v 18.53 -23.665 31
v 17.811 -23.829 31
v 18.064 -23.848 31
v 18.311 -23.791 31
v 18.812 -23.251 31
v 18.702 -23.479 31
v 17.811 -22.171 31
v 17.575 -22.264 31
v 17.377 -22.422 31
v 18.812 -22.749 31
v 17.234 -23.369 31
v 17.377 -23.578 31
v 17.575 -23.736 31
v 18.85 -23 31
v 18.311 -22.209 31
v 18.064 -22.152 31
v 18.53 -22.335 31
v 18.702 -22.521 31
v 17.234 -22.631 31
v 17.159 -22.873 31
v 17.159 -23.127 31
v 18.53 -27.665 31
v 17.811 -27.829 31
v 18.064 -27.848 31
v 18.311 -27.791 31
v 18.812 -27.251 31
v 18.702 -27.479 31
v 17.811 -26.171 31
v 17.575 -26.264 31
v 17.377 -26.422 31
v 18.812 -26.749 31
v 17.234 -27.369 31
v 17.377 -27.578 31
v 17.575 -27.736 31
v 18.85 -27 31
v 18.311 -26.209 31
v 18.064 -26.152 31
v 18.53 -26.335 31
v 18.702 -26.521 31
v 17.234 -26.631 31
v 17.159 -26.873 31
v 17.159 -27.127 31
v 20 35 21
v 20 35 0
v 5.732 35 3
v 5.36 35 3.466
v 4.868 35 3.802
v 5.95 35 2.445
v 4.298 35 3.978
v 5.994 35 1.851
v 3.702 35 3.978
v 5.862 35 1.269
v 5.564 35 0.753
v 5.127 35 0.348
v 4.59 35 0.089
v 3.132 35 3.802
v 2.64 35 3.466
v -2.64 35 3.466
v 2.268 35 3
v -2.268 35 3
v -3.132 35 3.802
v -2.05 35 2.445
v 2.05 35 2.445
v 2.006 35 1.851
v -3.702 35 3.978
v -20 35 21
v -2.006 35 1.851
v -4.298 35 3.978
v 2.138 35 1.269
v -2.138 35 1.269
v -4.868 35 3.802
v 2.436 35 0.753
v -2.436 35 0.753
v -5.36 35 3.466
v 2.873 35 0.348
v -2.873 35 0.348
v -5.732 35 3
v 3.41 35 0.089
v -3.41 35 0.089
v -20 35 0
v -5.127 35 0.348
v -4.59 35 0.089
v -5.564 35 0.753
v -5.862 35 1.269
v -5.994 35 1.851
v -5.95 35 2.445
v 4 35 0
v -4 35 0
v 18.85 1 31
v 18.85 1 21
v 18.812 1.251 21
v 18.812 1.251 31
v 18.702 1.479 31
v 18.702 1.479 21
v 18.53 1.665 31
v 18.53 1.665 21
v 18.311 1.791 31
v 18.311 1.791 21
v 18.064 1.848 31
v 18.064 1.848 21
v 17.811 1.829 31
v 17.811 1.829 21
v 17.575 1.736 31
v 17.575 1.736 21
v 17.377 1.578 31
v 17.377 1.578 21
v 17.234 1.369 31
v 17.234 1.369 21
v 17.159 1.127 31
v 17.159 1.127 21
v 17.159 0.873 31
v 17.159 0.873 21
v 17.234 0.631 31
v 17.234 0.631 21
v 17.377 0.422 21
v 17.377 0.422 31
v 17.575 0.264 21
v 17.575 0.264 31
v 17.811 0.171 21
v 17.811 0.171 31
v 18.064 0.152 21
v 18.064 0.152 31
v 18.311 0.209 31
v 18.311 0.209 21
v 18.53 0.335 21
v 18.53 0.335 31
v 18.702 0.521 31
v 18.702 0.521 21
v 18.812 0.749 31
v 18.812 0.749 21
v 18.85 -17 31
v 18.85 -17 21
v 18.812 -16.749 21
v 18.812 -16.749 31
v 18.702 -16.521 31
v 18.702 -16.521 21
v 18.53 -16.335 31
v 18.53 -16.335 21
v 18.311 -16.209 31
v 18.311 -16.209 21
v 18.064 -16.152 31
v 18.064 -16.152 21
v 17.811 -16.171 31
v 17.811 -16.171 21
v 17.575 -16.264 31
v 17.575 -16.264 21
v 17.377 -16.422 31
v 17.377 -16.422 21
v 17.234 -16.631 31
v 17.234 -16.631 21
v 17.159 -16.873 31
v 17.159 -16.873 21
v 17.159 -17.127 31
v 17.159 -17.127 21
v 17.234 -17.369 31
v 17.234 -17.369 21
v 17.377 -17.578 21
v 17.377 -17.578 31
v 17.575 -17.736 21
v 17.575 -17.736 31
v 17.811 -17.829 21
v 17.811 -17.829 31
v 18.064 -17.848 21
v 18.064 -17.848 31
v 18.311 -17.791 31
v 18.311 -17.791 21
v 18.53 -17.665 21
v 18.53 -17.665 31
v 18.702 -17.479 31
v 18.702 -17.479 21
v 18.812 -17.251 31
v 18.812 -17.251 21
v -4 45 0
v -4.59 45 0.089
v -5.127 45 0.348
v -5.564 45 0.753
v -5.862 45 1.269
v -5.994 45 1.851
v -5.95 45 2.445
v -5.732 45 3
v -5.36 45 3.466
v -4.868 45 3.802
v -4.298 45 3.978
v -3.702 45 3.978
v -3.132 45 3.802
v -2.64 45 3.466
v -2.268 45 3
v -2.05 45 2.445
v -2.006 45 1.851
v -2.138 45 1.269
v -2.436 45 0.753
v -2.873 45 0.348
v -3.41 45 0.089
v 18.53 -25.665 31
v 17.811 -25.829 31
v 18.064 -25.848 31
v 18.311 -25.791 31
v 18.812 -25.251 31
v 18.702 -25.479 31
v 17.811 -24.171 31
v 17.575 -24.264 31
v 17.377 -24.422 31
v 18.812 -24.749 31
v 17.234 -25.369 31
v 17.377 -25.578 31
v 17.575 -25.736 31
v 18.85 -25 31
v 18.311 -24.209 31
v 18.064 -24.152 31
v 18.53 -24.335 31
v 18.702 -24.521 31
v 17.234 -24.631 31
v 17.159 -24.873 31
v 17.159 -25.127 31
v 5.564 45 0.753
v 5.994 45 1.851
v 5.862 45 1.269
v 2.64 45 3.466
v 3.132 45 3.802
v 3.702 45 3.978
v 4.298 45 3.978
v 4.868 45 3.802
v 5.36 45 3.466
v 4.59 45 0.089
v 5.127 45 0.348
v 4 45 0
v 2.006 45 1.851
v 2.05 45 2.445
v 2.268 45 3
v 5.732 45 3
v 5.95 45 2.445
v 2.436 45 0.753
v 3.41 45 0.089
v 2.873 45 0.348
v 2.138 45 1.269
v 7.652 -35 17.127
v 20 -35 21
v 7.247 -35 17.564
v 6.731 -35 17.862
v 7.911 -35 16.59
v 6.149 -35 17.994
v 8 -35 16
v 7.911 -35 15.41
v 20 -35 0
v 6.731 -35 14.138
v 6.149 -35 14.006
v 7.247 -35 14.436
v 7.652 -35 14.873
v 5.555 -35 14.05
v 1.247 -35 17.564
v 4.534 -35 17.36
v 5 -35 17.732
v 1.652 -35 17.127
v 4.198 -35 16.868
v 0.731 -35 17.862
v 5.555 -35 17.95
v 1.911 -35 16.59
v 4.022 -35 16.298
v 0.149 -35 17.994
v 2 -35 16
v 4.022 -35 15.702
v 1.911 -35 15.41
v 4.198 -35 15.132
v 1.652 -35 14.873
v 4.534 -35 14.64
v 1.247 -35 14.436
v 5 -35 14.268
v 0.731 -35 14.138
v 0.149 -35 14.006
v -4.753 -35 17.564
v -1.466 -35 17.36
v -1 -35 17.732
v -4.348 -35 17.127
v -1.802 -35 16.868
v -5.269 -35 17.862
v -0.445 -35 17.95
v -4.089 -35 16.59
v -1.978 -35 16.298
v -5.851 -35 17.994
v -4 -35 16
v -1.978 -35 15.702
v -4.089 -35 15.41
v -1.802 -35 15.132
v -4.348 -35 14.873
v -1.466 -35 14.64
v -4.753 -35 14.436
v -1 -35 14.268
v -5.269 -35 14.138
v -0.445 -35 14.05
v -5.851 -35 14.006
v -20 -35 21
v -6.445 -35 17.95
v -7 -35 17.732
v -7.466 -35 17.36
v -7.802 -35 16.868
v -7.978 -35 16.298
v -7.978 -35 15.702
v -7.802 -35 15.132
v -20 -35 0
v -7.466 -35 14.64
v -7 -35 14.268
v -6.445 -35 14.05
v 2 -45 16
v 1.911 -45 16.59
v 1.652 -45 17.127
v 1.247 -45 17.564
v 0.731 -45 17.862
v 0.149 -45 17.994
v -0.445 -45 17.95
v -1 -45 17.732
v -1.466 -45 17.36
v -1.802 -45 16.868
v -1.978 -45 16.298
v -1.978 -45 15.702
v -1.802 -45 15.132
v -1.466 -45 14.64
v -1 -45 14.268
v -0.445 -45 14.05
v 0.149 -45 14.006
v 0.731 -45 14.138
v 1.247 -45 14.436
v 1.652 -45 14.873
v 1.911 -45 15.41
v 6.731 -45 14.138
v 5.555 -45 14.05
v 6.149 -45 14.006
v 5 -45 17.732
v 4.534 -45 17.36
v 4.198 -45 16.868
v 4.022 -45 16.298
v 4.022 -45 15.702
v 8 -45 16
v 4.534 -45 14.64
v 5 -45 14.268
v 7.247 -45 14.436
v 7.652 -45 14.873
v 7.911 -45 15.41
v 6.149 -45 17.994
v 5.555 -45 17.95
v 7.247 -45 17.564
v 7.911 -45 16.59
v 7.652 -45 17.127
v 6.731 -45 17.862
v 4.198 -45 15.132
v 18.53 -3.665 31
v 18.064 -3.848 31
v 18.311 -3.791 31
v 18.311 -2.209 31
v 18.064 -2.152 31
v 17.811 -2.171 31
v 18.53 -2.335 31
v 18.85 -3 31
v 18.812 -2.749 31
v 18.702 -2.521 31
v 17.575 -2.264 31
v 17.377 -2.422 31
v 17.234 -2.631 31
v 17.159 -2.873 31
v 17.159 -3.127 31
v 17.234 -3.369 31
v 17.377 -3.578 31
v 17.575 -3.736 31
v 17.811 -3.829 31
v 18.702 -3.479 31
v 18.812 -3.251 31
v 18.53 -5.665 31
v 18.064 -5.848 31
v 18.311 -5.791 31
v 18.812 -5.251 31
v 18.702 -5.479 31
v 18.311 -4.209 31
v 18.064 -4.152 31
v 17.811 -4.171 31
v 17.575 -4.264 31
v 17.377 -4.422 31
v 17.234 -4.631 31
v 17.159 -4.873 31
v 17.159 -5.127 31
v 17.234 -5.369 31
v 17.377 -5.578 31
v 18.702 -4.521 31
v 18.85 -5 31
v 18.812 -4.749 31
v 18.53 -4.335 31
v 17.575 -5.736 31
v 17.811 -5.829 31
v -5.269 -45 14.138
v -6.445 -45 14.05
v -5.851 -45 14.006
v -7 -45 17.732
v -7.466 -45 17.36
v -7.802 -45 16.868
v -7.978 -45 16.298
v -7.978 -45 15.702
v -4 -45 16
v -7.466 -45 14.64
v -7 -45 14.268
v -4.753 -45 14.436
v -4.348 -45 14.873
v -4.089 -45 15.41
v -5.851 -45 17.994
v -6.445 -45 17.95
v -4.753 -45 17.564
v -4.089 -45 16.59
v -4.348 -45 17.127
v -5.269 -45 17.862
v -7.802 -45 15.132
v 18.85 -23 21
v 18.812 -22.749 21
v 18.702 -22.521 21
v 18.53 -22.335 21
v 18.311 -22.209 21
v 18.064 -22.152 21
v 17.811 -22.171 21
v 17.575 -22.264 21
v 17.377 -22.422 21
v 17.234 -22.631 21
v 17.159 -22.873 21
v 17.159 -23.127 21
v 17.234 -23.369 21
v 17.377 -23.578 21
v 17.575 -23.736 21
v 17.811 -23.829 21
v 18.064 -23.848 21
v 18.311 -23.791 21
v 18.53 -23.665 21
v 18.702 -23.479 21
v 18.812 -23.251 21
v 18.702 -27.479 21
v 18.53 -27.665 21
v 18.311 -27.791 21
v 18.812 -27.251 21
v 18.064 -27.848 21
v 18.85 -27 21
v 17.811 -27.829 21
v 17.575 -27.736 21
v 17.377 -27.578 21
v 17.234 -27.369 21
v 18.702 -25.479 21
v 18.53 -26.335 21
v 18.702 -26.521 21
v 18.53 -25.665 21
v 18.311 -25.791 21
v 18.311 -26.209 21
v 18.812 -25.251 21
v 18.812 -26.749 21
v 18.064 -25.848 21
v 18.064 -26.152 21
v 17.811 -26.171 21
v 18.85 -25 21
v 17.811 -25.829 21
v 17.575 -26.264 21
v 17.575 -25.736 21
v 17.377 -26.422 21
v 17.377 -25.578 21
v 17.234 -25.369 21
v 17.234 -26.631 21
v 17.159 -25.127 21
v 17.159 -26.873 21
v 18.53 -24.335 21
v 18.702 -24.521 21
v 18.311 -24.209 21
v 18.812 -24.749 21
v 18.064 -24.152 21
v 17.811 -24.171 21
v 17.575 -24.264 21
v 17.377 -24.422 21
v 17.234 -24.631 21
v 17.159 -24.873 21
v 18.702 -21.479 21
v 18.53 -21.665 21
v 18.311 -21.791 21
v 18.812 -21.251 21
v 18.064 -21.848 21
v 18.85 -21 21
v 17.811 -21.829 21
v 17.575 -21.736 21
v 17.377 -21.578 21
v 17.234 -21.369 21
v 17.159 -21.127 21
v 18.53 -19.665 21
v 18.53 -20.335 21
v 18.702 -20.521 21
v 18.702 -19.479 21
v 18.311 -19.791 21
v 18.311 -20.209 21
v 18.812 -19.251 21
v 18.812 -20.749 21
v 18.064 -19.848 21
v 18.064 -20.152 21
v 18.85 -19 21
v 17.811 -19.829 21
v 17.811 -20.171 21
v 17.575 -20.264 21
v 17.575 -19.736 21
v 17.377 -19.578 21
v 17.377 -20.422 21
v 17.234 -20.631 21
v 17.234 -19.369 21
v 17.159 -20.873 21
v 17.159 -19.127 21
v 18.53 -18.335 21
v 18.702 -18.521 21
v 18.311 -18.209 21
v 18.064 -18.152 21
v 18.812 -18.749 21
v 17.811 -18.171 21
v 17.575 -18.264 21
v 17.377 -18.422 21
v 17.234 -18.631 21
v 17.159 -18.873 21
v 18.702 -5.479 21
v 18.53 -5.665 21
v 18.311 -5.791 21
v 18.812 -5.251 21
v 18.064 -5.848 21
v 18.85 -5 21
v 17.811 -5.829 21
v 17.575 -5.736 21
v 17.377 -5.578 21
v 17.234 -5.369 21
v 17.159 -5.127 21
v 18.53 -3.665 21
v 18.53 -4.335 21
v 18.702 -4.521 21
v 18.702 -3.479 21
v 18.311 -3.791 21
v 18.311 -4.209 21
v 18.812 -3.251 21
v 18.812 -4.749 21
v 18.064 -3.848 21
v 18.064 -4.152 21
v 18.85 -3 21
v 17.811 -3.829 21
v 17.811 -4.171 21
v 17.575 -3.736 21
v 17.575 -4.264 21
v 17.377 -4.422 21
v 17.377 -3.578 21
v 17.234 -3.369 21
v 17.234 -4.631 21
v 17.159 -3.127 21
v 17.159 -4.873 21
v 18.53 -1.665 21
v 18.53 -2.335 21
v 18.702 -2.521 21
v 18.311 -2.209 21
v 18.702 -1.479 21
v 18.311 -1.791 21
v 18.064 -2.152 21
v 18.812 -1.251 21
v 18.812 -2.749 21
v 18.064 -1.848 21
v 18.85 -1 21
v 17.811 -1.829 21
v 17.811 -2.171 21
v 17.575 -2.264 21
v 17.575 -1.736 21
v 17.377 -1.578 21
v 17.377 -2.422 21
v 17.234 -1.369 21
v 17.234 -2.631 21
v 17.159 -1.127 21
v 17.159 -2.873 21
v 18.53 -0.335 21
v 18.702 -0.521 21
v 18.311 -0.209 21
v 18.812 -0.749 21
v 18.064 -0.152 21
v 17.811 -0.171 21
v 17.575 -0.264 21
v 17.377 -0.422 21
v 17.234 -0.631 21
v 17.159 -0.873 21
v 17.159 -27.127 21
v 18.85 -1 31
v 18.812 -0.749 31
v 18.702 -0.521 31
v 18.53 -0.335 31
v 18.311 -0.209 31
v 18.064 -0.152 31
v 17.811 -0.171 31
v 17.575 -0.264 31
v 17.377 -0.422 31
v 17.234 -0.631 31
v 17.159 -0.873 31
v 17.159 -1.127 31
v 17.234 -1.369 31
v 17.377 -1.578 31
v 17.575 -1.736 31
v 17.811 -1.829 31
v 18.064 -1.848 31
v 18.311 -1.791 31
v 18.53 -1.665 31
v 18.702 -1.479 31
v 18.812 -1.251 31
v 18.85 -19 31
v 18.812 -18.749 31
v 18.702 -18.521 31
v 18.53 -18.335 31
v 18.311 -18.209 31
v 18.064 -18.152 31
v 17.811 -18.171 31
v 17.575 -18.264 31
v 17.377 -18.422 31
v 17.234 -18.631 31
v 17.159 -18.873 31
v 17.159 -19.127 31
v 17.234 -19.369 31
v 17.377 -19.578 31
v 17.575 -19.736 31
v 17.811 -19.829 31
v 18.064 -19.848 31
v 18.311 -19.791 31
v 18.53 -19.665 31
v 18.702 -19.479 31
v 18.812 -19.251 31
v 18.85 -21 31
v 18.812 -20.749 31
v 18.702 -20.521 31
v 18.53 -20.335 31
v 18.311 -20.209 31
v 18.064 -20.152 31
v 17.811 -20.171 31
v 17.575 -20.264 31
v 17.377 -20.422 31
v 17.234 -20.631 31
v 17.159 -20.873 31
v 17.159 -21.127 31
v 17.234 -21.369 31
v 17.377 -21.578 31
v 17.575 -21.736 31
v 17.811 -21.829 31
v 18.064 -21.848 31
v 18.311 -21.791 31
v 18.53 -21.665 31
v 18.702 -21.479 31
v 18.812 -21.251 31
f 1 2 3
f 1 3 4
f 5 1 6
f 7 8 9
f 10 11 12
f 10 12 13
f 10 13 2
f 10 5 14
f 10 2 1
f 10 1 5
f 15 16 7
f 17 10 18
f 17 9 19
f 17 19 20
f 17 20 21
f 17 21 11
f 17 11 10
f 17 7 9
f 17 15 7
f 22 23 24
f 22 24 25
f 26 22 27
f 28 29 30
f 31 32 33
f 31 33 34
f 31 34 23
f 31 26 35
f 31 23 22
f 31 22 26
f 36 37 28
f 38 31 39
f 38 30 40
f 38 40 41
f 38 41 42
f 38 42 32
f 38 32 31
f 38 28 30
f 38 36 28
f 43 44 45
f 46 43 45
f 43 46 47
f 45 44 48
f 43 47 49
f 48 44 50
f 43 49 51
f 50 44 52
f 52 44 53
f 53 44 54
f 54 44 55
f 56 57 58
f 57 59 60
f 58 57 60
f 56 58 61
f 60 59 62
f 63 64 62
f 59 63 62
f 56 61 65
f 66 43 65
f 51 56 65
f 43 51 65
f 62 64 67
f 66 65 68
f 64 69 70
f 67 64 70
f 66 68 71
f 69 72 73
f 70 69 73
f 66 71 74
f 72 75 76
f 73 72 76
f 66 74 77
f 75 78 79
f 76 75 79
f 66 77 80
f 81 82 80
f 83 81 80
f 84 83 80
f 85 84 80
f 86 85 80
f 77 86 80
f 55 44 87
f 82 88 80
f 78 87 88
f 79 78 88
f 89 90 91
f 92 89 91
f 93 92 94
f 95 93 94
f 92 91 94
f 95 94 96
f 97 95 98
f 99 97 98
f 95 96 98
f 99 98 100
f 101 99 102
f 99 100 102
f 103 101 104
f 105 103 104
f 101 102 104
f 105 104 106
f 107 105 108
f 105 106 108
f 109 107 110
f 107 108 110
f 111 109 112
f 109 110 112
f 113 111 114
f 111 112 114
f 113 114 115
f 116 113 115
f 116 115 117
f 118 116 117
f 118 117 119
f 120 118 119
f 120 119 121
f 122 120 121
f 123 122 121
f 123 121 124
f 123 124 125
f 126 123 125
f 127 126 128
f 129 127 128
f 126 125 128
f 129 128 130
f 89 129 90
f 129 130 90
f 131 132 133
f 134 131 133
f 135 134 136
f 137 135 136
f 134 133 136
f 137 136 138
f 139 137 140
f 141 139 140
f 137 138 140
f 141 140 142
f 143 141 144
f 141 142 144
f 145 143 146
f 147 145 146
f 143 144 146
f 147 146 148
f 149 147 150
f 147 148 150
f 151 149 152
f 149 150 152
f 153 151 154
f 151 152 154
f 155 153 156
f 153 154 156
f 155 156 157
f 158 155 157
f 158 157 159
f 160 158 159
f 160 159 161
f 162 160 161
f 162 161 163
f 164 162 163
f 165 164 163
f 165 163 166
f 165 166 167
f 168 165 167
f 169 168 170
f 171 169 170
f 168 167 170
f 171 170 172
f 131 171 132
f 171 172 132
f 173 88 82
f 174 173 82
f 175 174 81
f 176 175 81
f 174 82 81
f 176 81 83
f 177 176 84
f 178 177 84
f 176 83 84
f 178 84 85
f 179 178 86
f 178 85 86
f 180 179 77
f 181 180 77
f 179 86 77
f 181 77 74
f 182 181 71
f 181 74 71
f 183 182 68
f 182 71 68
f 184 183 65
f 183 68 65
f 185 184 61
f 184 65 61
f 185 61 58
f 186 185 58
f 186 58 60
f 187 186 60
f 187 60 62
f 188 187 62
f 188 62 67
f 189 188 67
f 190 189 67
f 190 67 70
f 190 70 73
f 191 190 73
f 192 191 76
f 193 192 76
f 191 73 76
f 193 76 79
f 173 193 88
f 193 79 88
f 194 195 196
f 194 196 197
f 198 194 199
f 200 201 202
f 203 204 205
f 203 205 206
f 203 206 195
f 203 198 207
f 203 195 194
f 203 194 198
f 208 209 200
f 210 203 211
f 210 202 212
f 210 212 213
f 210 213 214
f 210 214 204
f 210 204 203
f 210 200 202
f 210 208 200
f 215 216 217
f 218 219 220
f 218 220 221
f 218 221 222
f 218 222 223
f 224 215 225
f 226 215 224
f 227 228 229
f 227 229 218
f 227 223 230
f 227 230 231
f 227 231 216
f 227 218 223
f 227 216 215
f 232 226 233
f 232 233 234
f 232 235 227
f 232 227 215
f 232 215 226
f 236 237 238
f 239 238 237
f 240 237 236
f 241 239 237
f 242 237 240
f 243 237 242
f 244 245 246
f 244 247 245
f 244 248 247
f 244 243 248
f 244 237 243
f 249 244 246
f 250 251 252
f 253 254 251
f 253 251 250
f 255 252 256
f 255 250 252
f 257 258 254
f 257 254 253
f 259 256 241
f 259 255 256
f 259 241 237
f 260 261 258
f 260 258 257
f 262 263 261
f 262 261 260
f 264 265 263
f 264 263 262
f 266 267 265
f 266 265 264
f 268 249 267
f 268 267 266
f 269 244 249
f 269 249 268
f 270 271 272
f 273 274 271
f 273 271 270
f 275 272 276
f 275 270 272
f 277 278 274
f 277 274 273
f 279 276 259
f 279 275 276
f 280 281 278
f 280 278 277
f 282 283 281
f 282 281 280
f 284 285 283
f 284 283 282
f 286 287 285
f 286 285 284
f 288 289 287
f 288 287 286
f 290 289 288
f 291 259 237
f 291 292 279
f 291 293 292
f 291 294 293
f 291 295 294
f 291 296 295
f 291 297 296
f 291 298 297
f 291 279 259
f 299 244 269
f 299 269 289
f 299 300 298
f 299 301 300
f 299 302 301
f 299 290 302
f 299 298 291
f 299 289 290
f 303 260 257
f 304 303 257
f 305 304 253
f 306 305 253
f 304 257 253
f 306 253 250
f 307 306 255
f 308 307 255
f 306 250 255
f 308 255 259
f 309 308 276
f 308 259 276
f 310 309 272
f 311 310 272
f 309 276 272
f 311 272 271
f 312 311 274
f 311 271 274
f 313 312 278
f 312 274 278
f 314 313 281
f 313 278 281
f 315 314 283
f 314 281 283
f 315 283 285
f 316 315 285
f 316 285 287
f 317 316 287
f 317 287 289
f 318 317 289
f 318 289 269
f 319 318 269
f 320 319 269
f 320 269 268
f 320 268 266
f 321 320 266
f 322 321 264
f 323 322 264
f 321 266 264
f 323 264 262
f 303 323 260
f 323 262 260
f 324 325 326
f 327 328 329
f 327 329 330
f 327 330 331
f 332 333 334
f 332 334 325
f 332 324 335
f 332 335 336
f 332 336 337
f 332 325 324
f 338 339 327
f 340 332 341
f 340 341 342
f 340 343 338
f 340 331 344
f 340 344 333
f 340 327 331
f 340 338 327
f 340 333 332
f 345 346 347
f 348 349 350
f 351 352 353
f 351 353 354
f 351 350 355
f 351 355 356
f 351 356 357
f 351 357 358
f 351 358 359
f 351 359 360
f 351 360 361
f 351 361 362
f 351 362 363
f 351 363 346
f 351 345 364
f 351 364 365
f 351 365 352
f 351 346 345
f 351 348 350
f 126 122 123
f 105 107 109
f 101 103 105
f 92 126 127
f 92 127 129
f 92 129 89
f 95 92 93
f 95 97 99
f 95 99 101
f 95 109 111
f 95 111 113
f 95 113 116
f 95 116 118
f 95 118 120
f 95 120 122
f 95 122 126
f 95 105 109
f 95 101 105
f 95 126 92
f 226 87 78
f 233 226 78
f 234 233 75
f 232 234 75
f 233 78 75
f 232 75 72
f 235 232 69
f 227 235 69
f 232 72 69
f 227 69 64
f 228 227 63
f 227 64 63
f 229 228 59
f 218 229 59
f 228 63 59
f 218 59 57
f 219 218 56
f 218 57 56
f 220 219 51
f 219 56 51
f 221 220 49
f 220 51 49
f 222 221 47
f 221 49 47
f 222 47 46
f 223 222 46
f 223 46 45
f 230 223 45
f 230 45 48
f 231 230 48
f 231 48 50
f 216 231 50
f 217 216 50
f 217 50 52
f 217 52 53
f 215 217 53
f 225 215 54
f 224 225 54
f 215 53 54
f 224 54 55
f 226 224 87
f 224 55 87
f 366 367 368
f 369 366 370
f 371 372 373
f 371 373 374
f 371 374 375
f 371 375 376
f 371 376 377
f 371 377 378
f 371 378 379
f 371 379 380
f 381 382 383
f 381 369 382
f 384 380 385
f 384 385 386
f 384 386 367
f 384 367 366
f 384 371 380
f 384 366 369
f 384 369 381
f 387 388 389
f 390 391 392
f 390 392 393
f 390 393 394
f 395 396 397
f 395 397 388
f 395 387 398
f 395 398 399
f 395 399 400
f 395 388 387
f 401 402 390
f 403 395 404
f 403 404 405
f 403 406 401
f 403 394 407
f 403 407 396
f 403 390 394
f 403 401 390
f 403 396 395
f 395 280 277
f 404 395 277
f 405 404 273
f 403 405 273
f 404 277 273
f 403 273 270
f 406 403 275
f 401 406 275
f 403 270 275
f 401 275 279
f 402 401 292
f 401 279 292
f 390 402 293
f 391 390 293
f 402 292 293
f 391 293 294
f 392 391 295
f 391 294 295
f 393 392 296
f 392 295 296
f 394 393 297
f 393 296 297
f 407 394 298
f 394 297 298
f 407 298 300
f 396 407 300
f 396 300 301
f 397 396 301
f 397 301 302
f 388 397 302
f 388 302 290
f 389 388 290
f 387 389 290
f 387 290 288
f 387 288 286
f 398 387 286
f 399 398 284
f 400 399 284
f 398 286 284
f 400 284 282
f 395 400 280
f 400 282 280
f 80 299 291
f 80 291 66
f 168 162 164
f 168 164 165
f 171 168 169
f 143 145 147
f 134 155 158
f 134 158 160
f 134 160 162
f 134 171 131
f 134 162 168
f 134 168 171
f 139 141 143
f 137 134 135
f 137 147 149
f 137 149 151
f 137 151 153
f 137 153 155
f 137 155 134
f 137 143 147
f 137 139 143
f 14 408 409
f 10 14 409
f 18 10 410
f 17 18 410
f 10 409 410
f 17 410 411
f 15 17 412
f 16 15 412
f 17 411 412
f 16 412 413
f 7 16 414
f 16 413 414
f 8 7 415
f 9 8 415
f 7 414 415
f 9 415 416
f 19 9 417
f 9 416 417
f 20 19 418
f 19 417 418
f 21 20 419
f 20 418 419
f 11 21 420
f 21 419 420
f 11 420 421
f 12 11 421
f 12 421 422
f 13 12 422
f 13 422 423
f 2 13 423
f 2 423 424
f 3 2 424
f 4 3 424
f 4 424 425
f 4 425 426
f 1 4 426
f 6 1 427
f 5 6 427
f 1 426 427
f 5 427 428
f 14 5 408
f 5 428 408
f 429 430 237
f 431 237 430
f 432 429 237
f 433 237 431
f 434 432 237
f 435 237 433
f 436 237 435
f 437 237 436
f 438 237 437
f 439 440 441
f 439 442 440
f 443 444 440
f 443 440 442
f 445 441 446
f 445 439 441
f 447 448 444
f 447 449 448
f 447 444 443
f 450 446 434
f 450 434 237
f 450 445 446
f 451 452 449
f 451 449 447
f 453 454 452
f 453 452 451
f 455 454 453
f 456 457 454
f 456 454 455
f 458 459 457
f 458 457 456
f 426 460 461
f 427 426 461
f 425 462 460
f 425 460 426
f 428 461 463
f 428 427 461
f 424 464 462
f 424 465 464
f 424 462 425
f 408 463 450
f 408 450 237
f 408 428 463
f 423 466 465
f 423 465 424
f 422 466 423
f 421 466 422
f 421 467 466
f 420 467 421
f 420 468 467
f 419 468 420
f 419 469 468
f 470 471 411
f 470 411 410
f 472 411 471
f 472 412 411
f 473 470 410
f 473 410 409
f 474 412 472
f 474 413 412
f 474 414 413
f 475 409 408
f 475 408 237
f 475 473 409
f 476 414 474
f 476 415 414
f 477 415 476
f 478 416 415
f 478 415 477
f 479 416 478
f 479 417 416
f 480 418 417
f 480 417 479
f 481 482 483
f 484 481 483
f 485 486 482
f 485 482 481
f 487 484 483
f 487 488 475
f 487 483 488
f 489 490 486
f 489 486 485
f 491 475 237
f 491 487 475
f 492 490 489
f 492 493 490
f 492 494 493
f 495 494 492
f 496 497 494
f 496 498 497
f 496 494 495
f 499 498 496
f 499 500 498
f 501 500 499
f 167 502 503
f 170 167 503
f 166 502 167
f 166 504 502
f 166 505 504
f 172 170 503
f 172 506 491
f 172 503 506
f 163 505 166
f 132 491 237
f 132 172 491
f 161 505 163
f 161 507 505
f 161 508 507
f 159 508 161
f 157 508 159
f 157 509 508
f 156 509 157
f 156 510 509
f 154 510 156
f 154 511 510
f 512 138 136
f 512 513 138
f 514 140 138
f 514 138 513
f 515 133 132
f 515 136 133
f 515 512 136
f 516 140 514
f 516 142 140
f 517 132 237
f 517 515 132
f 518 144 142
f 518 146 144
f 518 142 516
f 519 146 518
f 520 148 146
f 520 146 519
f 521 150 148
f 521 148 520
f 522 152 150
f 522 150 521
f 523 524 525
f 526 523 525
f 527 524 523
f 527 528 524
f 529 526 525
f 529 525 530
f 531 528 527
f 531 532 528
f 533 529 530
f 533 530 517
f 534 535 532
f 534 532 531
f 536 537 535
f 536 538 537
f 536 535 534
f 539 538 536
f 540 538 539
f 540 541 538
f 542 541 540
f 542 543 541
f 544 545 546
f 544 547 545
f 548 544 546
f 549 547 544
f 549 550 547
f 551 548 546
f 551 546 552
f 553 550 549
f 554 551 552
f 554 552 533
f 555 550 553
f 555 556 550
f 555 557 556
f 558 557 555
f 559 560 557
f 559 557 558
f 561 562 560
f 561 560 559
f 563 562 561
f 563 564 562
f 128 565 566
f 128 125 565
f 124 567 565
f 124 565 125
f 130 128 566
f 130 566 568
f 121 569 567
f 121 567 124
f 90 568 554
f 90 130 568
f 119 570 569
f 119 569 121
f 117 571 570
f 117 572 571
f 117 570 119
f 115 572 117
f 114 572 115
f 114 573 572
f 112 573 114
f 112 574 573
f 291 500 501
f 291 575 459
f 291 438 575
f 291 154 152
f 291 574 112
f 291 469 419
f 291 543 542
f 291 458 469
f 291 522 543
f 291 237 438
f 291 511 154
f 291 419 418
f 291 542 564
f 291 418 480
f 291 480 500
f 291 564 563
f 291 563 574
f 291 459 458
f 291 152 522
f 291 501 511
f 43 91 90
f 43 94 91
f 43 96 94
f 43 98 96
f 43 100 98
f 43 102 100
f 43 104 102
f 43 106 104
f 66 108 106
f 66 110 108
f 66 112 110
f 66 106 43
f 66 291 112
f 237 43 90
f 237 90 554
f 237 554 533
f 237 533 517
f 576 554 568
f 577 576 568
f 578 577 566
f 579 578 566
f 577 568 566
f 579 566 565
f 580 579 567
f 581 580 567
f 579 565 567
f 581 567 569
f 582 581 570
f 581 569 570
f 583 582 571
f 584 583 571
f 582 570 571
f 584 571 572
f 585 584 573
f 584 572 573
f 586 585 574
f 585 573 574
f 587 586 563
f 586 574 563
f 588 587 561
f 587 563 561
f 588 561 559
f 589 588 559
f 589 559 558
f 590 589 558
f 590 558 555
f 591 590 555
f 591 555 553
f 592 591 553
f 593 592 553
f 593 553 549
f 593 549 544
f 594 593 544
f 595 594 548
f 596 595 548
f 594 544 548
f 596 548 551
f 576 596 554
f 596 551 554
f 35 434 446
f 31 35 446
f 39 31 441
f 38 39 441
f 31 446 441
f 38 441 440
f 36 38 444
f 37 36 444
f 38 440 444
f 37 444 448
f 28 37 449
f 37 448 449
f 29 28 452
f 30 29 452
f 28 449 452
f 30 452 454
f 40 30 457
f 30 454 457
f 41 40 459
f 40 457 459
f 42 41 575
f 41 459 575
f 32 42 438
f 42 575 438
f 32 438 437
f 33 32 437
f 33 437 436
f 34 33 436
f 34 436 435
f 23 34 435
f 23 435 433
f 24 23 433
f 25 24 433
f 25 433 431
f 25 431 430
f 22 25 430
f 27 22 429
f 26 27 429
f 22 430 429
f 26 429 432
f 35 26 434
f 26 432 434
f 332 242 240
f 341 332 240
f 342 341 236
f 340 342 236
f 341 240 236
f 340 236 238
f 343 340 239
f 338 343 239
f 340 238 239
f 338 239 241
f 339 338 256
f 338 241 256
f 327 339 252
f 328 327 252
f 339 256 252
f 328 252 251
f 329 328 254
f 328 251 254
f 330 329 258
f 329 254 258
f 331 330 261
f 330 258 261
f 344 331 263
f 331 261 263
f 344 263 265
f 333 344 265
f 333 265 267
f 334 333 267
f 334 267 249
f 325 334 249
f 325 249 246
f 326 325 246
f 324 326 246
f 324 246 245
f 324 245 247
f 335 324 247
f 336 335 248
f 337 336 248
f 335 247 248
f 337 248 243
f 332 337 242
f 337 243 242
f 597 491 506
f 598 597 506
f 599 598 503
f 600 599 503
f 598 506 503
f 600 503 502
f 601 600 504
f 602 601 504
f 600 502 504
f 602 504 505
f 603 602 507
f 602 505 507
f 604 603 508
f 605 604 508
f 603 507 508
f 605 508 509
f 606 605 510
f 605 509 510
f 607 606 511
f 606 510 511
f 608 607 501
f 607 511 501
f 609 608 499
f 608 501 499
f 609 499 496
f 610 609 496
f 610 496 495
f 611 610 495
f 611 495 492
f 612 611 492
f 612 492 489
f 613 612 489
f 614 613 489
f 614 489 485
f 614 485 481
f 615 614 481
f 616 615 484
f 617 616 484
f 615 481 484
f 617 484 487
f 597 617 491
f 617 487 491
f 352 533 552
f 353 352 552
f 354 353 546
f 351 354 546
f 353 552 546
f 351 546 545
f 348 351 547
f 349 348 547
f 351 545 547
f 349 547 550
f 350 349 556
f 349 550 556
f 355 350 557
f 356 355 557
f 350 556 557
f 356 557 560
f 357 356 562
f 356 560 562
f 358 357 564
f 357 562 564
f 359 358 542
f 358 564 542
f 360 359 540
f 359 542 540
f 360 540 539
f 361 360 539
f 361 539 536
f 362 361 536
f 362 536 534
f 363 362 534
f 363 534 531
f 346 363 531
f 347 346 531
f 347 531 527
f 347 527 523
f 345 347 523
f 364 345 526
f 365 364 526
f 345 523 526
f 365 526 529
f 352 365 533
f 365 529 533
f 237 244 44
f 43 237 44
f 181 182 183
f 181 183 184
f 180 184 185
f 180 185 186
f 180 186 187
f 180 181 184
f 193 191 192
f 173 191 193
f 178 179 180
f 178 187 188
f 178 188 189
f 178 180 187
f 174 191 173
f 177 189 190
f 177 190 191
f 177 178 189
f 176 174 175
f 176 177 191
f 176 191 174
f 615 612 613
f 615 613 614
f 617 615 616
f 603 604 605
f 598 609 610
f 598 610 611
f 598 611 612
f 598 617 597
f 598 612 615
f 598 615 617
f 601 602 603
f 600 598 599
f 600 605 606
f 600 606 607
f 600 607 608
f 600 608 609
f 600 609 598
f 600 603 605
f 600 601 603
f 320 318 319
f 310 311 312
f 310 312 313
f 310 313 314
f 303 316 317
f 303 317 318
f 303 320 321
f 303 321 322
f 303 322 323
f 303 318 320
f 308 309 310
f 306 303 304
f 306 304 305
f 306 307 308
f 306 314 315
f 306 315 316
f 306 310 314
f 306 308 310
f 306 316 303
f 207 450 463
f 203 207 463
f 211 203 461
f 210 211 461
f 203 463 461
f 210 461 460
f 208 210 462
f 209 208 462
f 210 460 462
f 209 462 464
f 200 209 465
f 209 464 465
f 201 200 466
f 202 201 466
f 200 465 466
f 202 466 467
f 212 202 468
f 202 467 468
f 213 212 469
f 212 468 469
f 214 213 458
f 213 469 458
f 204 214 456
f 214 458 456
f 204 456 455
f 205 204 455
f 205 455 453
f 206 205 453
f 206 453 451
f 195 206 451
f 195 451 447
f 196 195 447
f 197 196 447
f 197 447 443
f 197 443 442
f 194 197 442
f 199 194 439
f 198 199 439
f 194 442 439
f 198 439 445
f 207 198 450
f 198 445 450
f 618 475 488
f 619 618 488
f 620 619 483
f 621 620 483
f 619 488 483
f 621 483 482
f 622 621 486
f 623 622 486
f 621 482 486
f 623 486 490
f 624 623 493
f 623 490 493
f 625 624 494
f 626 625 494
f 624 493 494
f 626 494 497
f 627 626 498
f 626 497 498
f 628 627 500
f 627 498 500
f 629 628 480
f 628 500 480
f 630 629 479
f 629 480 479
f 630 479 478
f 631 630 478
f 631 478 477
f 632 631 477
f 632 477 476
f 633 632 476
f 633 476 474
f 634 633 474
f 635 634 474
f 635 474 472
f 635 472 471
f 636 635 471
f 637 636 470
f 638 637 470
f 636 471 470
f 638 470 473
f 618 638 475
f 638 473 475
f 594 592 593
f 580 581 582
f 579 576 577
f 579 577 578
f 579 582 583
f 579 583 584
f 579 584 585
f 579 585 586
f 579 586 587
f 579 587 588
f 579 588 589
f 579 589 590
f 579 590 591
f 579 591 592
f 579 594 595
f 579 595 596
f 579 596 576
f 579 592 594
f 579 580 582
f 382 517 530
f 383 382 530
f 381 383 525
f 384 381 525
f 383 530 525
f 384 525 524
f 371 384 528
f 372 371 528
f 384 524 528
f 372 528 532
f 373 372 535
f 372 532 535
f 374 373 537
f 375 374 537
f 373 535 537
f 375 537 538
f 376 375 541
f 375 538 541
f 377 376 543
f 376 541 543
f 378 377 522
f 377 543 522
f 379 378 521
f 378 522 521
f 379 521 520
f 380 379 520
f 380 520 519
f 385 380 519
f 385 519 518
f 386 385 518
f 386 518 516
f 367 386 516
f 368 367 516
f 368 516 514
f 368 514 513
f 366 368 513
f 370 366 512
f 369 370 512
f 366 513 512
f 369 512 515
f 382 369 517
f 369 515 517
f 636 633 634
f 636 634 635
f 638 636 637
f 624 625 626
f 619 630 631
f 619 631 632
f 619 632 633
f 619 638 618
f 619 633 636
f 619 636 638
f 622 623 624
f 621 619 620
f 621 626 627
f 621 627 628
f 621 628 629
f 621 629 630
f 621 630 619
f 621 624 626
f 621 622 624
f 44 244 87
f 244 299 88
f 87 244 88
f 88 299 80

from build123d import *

# Parameters (mm, degrees)
SKETCH1_W           = 70
SKETCH1_H           = 40
BOSS_EXTRUDE1_DEPTH = 21
SKETCH2_R           = 2
BOSS_EXTRUDE2_DEPTH = 10
SKETCH3_R           = 2
BOSS_EXTRUDE3_DEPTH = 10
SKETCH4_R           = 0.85
BOSS_EXTRUDE4_DEPTH = 10


with BuildPart() as part:
    # Sketch1 → Boss-Extrude1 (new body)
    with BuildSketch(Plane(origin=(0, 0, 0), x_dir=(0, 1, 0), z_dir=(0, 0, 1))):
        Rectangle(SKETCH1_W, SKETCH1_H)
    extrude(amount=BOSS_EXTRUDE1_DEPTH)

    # Sketch2 → Boss-Extrude2 (add)
    with BuildSketch(Plane.XZ.offset(35)):
        with Locations((-6, 16)):
            Circle(SKETCH2_R)
        with Locations((0, 16)):
            Circle(SKETCH2_R)
        with Locations((6, 16)):
            Circle(SKETCH2_R)
    extrude(amount=BOSS_EXTRUDE2_DEPTH)

    # Sketch3 → Boss-Extrude3 (add)
    with BuildSketch(Plane(origin=(0, 35, 0), x_dir=(-1, 0, 0), z_dir=(0, 1, 0))):
        with Locations(Location((-4, 2, 0), (0, 0, 270))):
            Circle(SKETCH3_R)
        with Locations(Location((4, 2, 0), (0, 0, 270))):
            Circle(SKETCH3_R)
    extrude(amount=BOSS_EXTRUDE3_DEPTH)

    # Sketch4 → Boss-Extrude4 (add)
    with BuildSketch(Plane.XY.offset(21)):
        with Locations((18, -27)):
            Circle(SKETCH4_R)
        with Locations((18, -25)):
            Circle(SKETCH4_R)
        with Locations((18, -23)):
            Circle(SKETCH4_R)
        with Locations((18, -21)):
            Circle(SKETCH4_R)
        with Locations((18, -19)):
            Circle(SKETCH4_R)
        with Locations((18, -17)):
            Circle(SKETCH4_R)
        with Locations((18, -5)):
            Circle(SKETCH4_R)
        with Locations((18, -3)):
            Circle(SKETCH4_R)
        with Locations((18, -1)):
            Circle(SKETCH4_R)
        with Locations((18, 1)):
            Circle(SKETCH4_R)
    extrude(amount=BOSS_EXTRUDE4_DEPTH)


solid = part.part
